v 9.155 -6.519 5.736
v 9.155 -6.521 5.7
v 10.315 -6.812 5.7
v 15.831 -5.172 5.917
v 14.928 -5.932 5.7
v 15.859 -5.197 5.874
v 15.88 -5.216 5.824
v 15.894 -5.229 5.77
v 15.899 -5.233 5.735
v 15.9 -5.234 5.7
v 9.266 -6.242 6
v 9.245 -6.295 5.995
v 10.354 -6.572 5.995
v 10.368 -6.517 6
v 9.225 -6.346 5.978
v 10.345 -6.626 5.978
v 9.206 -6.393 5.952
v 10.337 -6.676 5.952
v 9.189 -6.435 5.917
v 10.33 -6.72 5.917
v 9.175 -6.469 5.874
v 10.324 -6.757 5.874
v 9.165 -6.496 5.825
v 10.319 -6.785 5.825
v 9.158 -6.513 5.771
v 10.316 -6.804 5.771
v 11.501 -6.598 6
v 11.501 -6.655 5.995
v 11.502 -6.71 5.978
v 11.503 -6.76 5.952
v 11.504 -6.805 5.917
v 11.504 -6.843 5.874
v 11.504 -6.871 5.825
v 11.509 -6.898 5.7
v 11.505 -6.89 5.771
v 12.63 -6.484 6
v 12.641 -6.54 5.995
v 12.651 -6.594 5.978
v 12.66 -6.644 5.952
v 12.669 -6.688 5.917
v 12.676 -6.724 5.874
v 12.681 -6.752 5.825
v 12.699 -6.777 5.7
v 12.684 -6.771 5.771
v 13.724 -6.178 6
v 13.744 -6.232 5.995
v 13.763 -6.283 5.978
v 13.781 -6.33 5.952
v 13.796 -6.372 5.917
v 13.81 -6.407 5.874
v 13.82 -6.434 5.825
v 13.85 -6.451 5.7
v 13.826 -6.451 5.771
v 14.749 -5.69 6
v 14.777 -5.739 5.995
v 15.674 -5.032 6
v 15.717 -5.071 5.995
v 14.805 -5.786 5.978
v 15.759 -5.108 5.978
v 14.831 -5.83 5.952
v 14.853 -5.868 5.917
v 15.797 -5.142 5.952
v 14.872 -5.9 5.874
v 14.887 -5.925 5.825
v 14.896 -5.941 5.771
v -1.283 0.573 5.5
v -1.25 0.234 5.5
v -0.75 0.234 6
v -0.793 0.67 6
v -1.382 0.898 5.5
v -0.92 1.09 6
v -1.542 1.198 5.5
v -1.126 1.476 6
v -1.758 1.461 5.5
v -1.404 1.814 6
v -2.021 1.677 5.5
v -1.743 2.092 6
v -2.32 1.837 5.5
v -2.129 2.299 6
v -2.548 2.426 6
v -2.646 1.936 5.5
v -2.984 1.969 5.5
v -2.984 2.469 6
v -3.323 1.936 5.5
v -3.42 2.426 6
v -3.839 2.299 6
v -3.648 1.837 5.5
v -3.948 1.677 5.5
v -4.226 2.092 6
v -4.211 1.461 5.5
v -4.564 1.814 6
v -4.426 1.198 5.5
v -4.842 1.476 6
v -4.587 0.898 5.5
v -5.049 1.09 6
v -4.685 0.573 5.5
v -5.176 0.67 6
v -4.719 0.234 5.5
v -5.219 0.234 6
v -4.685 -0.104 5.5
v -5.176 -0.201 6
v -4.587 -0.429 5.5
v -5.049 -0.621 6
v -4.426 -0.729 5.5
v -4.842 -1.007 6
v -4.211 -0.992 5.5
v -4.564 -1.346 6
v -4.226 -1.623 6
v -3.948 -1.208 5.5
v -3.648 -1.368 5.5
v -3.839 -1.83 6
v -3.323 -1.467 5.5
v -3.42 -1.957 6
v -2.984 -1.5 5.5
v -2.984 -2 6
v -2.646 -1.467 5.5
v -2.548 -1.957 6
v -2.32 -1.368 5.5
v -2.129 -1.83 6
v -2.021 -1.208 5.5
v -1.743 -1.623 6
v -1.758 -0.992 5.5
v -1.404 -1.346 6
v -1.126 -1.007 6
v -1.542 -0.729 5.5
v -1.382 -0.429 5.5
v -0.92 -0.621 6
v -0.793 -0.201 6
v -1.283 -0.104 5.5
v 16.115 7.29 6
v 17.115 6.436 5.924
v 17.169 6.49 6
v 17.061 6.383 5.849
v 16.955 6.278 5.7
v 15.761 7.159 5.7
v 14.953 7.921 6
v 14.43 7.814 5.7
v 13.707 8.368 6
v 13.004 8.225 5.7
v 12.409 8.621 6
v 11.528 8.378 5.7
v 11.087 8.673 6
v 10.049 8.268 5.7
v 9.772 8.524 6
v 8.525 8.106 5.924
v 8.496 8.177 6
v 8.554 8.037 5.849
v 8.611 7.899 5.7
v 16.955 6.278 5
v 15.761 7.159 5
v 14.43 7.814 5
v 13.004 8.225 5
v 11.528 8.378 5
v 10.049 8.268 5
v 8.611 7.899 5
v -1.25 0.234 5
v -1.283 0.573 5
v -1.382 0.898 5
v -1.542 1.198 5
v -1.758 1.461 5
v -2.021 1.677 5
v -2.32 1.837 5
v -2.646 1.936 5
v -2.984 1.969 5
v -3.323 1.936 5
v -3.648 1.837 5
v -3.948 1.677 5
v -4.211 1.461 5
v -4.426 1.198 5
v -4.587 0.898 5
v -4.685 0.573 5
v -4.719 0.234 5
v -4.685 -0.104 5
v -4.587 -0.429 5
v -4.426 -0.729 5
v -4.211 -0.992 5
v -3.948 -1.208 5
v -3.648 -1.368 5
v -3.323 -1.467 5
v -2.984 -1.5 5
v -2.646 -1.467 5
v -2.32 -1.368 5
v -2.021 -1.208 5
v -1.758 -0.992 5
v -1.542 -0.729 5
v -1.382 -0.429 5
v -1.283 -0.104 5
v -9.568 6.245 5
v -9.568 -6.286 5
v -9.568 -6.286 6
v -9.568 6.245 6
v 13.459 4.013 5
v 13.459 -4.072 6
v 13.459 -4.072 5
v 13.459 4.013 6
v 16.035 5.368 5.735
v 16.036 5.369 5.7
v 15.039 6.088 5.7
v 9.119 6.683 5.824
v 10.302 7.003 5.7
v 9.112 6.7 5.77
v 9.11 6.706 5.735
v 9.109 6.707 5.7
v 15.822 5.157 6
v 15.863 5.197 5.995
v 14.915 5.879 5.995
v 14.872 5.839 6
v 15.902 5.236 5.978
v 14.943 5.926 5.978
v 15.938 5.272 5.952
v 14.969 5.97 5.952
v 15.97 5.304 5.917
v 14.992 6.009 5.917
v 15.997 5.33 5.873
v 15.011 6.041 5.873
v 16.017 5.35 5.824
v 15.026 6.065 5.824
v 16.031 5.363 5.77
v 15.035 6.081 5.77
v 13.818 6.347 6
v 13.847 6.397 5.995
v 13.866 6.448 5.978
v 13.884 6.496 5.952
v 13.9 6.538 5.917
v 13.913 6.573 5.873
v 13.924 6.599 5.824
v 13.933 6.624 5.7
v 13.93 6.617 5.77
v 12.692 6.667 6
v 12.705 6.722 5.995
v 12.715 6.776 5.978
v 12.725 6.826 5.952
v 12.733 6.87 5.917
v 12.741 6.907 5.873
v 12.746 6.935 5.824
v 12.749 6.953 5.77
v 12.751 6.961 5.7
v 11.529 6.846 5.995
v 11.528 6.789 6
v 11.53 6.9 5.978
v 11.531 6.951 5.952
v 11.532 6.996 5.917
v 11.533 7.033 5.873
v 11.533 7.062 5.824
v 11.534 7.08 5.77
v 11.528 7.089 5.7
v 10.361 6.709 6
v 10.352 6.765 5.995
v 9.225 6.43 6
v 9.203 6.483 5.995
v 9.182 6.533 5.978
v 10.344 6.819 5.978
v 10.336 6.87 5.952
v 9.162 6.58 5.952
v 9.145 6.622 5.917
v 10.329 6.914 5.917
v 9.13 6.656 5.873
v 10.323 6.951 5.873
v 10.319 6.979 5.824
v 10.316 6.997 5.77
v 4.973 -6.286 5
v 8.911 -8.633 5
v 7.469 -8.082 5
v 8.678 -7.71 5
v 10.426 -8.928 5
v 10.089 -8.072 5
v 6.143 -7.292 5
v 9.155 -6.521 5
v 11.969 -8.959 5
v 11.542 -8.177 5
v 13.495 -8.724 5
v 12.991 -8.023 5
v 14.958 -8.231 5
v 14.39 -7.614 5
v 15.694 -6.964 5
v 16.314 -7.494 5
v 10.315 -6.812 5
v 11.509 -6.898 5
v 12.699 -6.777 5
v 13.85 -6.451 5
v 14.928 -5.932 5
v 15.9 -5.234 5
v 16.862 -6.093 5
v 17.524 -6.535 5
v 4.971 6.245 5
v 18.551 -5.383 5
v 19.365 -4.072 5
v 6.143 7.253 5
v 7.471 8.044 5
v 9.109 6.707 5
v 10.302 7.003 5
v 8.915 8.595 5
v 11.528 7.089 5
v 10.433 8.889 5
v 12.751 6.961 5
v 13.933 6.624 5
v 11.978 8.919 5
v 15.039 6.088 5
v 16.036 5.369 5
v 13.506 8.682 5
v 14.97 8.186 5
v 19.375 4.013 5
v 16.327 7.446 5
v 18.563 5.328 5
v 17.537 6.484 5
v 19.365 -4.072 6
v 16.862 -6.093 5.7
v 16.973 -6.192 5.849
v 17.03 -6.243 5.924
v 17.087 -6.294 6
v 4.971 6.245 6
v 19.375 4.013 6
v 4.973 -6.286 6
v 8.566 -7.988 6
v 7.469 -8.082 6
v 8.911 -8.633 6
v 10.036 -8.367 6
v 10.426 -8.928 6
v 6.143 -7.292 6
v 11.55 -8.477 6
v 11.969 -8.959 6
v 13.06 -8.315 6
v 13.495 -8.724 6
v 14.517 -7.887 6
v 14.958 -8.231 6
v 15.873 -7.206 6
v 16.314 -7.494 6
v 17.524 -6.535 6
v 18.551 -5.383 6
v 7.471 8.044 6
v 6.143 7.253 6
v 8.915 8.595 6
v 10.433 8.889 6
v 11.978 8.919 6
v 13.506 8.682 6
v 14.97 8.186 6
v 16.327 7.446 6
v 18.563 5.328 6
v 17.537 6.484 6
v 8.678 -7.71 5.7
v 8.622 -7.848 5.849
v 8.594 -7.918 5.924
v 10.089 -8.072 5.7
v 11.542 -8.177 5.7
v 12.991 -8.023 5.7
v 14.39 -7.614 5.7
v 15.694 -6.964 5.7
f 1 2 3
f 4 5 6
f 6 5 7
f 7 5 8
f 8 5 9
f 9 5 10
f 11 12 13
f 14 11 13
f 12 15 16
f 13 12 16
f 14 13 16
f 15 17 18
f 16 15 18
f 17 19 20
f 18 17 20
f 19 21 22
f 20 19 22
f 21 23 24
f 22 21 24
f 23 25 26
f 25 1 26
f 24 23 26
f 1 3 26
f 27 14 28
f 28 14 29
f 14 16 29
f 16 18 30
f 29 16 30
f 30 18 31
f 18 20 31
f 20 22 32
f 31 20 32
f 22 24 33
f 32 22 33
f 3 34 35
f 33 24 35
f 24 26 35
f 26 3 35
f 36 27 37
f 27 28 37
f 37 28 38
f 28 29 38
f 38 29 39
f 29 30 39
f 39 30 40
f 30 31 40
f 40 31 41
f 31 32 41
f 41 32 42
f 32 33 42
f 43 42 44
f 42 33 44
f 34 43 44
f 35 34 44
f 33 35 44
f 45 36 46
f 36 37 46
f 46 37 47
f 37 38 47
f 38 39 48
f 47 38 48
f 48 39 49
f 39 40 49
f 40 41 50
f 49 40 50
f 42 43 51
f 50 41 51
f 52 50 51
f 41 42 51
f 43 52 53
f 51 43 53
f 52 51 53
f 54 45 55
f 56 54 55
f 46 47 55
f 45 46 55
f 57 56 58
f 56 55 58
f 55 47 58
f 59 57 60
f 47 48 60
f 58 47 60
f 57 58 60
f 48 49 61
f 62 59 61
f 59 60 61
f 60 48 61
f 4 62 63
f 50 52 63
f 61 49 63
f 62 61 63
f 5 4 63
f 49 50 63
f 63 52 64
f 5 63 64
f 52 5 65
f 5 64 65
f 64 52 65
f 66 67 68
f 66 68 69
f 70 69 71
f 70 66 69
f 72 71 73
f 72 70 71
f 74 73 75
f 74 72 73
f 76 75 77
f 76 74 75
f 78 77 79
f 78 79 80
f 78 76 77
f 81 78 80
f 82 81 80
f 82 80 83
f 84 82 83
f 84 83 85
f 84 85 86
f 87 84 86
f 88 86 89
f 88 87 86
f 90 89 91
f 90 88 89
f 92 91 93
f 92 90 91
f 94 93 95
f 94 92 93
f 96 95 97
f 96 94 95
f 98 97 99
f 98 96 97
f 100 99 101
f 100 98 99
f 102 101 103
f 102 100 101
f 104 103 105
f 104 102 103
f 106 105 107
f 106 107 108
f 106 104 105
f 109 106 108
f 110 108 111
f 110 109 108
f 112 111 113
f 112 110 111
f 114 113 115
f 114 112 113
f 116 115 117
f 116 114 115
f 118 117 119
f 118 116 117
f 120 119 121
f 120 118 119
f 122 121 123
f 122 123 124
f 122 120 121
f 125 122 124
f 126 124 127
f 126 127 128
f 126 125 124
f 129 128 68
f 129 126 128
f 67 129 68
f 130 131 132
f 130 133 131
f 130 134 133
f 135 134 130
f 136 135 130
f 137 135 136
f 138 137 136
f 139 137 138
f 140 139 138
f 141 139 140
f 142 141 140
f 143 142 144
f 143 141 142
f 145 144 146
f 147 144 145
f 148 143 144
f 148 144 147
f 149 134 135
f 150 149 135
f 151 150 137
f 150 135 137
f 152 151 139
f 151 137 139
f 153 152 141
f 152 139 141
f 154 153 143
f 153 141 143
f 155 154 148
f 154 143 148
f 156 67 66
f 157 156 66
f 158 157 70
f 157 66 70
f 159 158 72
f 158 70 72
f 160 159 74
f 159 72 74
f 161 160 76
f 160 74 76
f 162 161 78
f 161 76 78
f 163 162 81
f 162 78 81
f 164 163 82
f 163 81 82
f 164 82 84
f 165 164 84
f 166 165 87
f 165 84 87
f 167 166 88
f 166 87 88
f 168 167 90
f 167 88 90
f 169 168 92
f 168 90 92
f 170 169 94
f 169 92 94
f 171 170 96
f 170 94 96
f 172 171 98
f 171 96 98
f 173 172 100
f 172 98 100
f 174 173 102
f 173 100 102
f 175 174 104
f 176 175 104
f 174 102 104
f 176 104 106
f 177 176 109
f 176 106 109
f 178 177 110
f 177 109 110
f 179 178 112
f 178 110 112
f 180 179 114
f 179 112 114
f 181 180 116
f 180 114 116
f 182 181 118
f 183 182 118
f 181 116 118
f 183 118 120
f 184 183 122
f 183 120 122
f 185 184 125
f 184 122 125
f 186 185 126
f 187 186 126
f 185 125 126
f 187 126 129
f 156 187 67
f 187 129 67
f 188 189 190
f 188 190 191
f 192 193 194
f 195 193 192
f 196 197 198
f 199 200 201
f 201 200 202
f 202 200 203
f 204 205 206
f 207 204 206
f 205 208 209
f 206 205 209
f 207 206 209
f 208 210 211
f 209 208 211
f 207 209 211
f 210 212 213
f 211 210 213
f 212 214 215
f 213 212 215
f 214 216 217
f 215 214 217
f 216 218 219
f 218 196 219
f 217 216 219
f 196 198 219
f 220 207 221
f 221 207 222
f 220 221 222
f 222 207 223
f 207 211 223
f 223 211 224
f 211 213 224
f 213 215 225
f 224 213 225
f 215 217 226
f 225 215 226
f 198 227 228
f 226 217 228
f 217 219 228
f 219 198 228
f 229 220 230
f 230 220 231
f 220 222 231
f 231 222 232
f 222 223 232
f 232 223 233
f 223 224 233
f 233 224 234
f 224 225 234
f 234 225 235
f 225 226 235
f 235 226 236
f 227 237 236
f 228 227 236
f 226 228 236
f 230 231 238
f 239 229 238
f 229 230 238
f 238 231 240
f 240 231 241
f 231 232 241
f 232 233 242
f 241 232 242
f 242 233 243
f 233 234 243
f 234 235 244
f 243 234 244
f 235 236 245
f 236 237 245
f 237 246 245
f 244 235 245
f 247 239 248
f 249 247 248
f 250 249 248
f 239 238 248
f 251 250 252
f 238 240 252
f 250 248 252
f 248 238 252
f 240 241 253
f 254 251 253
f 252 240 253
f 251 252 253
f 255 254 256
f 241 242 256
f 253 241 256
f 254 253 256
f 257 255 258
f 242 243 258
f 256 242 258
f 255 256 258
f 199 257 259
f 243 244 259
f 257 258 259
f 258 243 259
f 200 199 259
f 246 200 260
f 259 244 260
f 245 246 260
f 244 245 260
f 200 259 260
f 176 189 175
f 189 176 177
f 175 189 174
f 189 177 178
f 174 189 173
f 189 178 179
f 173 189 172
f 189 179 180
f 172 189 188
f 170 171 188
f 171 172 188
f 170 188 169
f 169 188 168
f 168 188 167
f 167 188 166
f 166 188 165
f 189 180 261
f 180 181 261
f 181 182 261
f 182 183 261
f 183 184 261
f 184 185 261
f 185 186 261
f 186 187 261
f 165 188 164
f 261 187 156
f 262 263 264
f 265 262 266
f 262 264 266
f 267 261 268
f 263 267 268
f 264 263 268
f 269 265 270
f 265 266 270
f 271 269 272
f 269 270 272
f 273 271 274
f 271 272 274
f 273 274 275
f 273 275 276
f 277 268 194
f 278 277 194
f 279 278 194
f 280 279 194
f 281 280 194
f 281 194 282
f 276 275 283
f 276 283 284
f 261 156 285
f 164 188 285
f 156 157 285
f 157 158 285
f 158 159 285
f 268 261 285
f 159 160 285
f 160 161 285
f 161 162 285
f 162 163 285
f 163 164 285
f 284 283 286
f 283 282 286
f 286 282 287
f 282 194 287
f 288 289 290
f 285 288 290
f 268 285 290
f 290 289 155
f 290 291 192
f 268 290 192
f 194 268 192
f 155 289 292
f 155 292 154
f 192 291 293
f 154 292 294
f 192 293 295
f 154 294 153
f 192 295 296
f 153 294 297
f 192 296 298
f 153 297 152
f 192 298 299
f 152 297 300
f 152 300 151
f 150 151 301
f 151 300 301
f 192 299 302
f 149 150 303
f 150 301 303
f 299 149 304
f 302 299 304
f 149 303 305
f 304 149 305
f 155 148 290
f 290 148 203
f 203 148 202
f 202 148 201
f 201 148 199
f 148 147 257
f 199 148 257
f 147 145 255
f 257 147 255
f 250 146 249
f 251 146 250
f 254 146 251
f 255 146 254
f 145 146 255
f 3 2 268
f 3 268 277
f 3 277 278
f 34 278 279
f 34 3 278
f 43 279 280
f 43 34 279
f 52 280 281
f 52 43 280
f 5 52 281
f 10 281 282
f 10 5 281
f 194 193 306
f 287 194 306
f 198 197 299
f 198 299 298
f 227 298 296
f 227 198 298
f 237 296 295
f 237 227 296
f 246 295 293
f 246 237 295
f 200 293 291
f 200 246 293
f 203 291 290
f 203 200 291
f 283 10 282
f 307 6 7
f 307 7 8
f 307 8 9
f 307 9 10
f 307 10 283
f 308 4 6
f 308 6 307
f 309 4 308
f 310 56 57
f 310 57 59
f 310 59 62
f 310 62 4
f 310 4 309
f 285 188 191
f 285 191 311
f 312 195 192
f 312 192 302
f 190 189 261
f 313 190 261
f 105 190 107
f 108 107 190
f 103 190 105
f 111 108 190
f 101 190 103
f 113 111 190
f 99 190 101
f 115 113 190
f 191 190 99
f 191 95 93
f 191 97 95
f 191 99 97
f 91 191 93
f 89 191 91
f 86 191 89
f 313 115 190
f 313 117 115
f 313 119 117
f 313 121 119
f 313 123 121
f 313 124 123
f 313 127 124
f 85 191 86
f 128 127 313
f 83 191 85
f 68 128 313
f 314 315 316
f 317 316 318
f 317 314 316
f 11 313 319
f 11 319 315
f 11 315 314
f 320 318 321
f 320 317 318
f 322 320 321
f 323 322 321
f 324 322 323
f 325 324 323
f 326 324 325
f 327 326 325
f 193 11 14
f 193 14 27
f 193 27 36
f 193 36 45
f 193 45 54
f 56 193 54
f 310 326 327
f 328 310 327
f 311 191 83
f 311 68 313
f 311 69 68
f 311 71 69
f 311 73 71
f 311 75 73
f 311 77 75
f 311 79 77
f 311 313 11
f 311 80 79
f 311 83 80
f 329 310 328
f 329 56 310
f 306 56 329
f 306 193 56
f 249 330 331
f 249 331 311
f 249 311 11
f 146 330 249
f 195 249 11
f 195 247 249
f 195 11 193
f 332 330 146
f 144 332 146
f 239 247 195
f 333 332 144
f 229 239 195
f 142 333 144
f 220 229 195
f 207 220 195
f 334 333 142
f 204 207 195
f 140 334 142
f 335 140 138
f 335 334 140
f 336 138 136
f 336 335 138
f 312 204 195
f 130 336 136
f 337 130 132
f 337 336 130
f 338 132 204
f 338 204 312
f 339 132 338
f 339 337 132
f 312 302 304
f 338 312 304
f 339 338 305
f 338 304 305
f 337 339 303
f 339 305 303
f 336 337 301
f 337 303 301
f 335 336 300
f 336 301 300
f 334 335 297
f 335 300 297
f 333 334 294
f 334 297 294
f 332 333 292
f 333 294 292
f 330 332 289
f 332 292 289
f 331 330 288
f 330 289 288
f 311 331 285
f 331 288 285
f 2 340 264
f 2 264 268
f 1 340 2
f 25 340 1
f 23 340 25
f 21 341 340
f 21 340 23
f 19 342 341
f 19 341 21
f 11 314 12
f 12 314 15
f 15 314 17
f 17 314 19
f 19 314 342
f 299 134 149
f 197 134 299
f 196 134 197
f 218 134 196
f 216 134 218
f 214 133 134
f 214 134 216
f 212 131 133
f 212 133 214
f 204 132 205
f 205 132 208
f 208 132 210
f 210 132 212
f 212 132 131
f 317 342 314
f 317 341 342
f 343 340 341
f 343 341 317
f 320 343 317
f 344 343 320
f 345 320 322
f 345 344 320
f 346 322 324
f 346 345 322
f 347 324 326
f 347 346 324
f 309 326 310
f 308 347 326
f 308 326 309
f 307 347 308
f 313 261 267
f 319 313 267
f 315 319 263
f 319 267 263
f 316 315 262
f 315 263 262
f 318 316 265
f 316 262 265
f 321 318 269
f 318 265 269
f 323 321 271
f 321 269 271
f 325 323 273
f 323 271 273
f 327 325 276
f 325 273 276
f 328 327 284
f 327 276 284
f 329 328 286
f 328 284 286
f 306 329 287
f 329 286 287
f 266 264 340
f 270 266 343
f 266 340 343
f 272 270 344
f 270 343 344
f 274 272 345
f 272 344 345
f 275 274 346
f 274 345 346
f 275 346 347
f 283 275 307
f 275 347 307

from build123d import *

# Parameters (mm, degrees)
PAD002_DEPTH    = 1
SKETCH007_R     = 1.692877
POCKET001_DEPTH = 1
SKETCH008_R     = 1.73446
POCKET002_DEPTH = 1
CHAMFER_SIZE    = 0.5
POCKET005_DEPTH = 5
SKETCH009_W     = 8.212181
SKETCH009_H     = 8.085074
POCKET006_DEPTH = 5
FILLET004_R     = 0.3
FILLET005_R     = 0.3
CHAMFER001_SIZE = 0.3
CHAMFER002_SIZE = 0.3


with BuildPart() as part:
    # Sketch006 → Pad002 (new body)
    with BuildSketch(Plane.XY.offset(5)):
        with BuildLine():
            Line((-9.568426, -6.285917), (4.972526, -6.285917))
            ThreePointArc((4.972526, -6.285917), (20.334041, -0.01843), (4.970857, 6.244966))
            Line((-9.568426, 6.244966), (4.970857, 6.244966))
            Line((-9.568426, -6.285917), (-9.568426, 6.244966))
        make_face()
    extrude(amount=PAD002_DEPTH)

    # Sketch007 (on Pad) → Pocket001 (cut)
    with BuildSketch(Plane.XY.offset(5)):
        with Locations((-2.957902, 0.204839)):
            Circle(SKETCH007_R)
    extrude(amount=-POCKET001_DEPTH, mode=Mode.SUBTRACT)

    # Sketch008 (on Face6 of Pad002) → Pocket002 (cut)
    with BuildSketch(Plane.XY.offset(6)):
        with Locations((-2.984237, 0.234427)):
            Circle(SKETCH008_R)
    extrude(amount=-POCKET002_DEPTH, mode=Mode.SUBTRACT)

    # Chamfer
    chamfer_edges = [part.edges().sort_by_distance(p)[0] for p in [
        (-4.718697, 0.234427, 6),
    ]]
    chamfer(chamfer_edges, length=CHAMFER_SIZE)

    # Sketch011 → Pocket005 (cut)
    with BuildSketch(Plane.XY.offset(6)):
        with BuildLine():
            ThreePointArc((16.954988, 6.278391), (13.004004, 8.225263), (8.611476, 7.899254))
            Line((8.611476, 7.899254), (9.109037, 6.707427))
            ThreePointArc((16.036381, 5.369056), (12.751013, 6.961134), (9.109037, 6.707427))
            Line((16.954988, 6.278391), (16.036381, 5.369056))
        make_face()
        with BuildLine():
            ThreePointArc((8.677646, -7.709712), (12.991395, -8.023159), (16.861761, -6.092627))
            Line((15.900234, -5.234123), (16.861761, -6.092627))
            ThreePointArc((9.154517, -6.521003), (12.69888, -6.776571), (15.900234, -5.234123))
            Line((8.677646, -7.709712), (9.154517, -6.521003))
        make_face()
    extrude(amount=-POCKET005_DEPTH, mode=Mode.SUBTRACT)

    # Sketch009 (on Face1 of Chamfer) → Pocket006 (cut)
    with BuildSketch(Plane.XY.offset(6)):
        with Locations((17.565425, -0.029473)):
            Rectangle(SKETCH009_W, SKETCH009_H)
    extrude(amount=-POCKET006_DEPTH, mode=Mode.SUBTRACT)

    # Fillet004
    fillet004_edges = [part.edges().sort_by_distance(p)[0] for p in [
        (12.69888, -6.776571, 6),
    ]]
    fillet(fillet004_edges, radius=FILLET004_R)

    # Fillet005
    fillet005_edges = [part.edges().sort_by_distance(p)[0] for p in [
        (12.751013, 6.961134, 6),
    ]]
    fillet(fillet005_edges, radius=FILLET005_R)

    # Chamfer001
    chamfer001_edges = [part.edges().sort_by_distance(p)[0] for p in [
        (12.991395, -8.023159, 6),
    ]]
    chamfer(chamfer001_edges, length=CHAMFER001_SIZE)

    # Chamfer002
    chamfer002_edges = [part.edges().sort_by_distance(p)[0] for p in [
        (13.004004, 8.225263, 6),
    ]]
    chamfer(chamfer002_edges, length=CHAMFER002_SIZE)


solid = part.part
